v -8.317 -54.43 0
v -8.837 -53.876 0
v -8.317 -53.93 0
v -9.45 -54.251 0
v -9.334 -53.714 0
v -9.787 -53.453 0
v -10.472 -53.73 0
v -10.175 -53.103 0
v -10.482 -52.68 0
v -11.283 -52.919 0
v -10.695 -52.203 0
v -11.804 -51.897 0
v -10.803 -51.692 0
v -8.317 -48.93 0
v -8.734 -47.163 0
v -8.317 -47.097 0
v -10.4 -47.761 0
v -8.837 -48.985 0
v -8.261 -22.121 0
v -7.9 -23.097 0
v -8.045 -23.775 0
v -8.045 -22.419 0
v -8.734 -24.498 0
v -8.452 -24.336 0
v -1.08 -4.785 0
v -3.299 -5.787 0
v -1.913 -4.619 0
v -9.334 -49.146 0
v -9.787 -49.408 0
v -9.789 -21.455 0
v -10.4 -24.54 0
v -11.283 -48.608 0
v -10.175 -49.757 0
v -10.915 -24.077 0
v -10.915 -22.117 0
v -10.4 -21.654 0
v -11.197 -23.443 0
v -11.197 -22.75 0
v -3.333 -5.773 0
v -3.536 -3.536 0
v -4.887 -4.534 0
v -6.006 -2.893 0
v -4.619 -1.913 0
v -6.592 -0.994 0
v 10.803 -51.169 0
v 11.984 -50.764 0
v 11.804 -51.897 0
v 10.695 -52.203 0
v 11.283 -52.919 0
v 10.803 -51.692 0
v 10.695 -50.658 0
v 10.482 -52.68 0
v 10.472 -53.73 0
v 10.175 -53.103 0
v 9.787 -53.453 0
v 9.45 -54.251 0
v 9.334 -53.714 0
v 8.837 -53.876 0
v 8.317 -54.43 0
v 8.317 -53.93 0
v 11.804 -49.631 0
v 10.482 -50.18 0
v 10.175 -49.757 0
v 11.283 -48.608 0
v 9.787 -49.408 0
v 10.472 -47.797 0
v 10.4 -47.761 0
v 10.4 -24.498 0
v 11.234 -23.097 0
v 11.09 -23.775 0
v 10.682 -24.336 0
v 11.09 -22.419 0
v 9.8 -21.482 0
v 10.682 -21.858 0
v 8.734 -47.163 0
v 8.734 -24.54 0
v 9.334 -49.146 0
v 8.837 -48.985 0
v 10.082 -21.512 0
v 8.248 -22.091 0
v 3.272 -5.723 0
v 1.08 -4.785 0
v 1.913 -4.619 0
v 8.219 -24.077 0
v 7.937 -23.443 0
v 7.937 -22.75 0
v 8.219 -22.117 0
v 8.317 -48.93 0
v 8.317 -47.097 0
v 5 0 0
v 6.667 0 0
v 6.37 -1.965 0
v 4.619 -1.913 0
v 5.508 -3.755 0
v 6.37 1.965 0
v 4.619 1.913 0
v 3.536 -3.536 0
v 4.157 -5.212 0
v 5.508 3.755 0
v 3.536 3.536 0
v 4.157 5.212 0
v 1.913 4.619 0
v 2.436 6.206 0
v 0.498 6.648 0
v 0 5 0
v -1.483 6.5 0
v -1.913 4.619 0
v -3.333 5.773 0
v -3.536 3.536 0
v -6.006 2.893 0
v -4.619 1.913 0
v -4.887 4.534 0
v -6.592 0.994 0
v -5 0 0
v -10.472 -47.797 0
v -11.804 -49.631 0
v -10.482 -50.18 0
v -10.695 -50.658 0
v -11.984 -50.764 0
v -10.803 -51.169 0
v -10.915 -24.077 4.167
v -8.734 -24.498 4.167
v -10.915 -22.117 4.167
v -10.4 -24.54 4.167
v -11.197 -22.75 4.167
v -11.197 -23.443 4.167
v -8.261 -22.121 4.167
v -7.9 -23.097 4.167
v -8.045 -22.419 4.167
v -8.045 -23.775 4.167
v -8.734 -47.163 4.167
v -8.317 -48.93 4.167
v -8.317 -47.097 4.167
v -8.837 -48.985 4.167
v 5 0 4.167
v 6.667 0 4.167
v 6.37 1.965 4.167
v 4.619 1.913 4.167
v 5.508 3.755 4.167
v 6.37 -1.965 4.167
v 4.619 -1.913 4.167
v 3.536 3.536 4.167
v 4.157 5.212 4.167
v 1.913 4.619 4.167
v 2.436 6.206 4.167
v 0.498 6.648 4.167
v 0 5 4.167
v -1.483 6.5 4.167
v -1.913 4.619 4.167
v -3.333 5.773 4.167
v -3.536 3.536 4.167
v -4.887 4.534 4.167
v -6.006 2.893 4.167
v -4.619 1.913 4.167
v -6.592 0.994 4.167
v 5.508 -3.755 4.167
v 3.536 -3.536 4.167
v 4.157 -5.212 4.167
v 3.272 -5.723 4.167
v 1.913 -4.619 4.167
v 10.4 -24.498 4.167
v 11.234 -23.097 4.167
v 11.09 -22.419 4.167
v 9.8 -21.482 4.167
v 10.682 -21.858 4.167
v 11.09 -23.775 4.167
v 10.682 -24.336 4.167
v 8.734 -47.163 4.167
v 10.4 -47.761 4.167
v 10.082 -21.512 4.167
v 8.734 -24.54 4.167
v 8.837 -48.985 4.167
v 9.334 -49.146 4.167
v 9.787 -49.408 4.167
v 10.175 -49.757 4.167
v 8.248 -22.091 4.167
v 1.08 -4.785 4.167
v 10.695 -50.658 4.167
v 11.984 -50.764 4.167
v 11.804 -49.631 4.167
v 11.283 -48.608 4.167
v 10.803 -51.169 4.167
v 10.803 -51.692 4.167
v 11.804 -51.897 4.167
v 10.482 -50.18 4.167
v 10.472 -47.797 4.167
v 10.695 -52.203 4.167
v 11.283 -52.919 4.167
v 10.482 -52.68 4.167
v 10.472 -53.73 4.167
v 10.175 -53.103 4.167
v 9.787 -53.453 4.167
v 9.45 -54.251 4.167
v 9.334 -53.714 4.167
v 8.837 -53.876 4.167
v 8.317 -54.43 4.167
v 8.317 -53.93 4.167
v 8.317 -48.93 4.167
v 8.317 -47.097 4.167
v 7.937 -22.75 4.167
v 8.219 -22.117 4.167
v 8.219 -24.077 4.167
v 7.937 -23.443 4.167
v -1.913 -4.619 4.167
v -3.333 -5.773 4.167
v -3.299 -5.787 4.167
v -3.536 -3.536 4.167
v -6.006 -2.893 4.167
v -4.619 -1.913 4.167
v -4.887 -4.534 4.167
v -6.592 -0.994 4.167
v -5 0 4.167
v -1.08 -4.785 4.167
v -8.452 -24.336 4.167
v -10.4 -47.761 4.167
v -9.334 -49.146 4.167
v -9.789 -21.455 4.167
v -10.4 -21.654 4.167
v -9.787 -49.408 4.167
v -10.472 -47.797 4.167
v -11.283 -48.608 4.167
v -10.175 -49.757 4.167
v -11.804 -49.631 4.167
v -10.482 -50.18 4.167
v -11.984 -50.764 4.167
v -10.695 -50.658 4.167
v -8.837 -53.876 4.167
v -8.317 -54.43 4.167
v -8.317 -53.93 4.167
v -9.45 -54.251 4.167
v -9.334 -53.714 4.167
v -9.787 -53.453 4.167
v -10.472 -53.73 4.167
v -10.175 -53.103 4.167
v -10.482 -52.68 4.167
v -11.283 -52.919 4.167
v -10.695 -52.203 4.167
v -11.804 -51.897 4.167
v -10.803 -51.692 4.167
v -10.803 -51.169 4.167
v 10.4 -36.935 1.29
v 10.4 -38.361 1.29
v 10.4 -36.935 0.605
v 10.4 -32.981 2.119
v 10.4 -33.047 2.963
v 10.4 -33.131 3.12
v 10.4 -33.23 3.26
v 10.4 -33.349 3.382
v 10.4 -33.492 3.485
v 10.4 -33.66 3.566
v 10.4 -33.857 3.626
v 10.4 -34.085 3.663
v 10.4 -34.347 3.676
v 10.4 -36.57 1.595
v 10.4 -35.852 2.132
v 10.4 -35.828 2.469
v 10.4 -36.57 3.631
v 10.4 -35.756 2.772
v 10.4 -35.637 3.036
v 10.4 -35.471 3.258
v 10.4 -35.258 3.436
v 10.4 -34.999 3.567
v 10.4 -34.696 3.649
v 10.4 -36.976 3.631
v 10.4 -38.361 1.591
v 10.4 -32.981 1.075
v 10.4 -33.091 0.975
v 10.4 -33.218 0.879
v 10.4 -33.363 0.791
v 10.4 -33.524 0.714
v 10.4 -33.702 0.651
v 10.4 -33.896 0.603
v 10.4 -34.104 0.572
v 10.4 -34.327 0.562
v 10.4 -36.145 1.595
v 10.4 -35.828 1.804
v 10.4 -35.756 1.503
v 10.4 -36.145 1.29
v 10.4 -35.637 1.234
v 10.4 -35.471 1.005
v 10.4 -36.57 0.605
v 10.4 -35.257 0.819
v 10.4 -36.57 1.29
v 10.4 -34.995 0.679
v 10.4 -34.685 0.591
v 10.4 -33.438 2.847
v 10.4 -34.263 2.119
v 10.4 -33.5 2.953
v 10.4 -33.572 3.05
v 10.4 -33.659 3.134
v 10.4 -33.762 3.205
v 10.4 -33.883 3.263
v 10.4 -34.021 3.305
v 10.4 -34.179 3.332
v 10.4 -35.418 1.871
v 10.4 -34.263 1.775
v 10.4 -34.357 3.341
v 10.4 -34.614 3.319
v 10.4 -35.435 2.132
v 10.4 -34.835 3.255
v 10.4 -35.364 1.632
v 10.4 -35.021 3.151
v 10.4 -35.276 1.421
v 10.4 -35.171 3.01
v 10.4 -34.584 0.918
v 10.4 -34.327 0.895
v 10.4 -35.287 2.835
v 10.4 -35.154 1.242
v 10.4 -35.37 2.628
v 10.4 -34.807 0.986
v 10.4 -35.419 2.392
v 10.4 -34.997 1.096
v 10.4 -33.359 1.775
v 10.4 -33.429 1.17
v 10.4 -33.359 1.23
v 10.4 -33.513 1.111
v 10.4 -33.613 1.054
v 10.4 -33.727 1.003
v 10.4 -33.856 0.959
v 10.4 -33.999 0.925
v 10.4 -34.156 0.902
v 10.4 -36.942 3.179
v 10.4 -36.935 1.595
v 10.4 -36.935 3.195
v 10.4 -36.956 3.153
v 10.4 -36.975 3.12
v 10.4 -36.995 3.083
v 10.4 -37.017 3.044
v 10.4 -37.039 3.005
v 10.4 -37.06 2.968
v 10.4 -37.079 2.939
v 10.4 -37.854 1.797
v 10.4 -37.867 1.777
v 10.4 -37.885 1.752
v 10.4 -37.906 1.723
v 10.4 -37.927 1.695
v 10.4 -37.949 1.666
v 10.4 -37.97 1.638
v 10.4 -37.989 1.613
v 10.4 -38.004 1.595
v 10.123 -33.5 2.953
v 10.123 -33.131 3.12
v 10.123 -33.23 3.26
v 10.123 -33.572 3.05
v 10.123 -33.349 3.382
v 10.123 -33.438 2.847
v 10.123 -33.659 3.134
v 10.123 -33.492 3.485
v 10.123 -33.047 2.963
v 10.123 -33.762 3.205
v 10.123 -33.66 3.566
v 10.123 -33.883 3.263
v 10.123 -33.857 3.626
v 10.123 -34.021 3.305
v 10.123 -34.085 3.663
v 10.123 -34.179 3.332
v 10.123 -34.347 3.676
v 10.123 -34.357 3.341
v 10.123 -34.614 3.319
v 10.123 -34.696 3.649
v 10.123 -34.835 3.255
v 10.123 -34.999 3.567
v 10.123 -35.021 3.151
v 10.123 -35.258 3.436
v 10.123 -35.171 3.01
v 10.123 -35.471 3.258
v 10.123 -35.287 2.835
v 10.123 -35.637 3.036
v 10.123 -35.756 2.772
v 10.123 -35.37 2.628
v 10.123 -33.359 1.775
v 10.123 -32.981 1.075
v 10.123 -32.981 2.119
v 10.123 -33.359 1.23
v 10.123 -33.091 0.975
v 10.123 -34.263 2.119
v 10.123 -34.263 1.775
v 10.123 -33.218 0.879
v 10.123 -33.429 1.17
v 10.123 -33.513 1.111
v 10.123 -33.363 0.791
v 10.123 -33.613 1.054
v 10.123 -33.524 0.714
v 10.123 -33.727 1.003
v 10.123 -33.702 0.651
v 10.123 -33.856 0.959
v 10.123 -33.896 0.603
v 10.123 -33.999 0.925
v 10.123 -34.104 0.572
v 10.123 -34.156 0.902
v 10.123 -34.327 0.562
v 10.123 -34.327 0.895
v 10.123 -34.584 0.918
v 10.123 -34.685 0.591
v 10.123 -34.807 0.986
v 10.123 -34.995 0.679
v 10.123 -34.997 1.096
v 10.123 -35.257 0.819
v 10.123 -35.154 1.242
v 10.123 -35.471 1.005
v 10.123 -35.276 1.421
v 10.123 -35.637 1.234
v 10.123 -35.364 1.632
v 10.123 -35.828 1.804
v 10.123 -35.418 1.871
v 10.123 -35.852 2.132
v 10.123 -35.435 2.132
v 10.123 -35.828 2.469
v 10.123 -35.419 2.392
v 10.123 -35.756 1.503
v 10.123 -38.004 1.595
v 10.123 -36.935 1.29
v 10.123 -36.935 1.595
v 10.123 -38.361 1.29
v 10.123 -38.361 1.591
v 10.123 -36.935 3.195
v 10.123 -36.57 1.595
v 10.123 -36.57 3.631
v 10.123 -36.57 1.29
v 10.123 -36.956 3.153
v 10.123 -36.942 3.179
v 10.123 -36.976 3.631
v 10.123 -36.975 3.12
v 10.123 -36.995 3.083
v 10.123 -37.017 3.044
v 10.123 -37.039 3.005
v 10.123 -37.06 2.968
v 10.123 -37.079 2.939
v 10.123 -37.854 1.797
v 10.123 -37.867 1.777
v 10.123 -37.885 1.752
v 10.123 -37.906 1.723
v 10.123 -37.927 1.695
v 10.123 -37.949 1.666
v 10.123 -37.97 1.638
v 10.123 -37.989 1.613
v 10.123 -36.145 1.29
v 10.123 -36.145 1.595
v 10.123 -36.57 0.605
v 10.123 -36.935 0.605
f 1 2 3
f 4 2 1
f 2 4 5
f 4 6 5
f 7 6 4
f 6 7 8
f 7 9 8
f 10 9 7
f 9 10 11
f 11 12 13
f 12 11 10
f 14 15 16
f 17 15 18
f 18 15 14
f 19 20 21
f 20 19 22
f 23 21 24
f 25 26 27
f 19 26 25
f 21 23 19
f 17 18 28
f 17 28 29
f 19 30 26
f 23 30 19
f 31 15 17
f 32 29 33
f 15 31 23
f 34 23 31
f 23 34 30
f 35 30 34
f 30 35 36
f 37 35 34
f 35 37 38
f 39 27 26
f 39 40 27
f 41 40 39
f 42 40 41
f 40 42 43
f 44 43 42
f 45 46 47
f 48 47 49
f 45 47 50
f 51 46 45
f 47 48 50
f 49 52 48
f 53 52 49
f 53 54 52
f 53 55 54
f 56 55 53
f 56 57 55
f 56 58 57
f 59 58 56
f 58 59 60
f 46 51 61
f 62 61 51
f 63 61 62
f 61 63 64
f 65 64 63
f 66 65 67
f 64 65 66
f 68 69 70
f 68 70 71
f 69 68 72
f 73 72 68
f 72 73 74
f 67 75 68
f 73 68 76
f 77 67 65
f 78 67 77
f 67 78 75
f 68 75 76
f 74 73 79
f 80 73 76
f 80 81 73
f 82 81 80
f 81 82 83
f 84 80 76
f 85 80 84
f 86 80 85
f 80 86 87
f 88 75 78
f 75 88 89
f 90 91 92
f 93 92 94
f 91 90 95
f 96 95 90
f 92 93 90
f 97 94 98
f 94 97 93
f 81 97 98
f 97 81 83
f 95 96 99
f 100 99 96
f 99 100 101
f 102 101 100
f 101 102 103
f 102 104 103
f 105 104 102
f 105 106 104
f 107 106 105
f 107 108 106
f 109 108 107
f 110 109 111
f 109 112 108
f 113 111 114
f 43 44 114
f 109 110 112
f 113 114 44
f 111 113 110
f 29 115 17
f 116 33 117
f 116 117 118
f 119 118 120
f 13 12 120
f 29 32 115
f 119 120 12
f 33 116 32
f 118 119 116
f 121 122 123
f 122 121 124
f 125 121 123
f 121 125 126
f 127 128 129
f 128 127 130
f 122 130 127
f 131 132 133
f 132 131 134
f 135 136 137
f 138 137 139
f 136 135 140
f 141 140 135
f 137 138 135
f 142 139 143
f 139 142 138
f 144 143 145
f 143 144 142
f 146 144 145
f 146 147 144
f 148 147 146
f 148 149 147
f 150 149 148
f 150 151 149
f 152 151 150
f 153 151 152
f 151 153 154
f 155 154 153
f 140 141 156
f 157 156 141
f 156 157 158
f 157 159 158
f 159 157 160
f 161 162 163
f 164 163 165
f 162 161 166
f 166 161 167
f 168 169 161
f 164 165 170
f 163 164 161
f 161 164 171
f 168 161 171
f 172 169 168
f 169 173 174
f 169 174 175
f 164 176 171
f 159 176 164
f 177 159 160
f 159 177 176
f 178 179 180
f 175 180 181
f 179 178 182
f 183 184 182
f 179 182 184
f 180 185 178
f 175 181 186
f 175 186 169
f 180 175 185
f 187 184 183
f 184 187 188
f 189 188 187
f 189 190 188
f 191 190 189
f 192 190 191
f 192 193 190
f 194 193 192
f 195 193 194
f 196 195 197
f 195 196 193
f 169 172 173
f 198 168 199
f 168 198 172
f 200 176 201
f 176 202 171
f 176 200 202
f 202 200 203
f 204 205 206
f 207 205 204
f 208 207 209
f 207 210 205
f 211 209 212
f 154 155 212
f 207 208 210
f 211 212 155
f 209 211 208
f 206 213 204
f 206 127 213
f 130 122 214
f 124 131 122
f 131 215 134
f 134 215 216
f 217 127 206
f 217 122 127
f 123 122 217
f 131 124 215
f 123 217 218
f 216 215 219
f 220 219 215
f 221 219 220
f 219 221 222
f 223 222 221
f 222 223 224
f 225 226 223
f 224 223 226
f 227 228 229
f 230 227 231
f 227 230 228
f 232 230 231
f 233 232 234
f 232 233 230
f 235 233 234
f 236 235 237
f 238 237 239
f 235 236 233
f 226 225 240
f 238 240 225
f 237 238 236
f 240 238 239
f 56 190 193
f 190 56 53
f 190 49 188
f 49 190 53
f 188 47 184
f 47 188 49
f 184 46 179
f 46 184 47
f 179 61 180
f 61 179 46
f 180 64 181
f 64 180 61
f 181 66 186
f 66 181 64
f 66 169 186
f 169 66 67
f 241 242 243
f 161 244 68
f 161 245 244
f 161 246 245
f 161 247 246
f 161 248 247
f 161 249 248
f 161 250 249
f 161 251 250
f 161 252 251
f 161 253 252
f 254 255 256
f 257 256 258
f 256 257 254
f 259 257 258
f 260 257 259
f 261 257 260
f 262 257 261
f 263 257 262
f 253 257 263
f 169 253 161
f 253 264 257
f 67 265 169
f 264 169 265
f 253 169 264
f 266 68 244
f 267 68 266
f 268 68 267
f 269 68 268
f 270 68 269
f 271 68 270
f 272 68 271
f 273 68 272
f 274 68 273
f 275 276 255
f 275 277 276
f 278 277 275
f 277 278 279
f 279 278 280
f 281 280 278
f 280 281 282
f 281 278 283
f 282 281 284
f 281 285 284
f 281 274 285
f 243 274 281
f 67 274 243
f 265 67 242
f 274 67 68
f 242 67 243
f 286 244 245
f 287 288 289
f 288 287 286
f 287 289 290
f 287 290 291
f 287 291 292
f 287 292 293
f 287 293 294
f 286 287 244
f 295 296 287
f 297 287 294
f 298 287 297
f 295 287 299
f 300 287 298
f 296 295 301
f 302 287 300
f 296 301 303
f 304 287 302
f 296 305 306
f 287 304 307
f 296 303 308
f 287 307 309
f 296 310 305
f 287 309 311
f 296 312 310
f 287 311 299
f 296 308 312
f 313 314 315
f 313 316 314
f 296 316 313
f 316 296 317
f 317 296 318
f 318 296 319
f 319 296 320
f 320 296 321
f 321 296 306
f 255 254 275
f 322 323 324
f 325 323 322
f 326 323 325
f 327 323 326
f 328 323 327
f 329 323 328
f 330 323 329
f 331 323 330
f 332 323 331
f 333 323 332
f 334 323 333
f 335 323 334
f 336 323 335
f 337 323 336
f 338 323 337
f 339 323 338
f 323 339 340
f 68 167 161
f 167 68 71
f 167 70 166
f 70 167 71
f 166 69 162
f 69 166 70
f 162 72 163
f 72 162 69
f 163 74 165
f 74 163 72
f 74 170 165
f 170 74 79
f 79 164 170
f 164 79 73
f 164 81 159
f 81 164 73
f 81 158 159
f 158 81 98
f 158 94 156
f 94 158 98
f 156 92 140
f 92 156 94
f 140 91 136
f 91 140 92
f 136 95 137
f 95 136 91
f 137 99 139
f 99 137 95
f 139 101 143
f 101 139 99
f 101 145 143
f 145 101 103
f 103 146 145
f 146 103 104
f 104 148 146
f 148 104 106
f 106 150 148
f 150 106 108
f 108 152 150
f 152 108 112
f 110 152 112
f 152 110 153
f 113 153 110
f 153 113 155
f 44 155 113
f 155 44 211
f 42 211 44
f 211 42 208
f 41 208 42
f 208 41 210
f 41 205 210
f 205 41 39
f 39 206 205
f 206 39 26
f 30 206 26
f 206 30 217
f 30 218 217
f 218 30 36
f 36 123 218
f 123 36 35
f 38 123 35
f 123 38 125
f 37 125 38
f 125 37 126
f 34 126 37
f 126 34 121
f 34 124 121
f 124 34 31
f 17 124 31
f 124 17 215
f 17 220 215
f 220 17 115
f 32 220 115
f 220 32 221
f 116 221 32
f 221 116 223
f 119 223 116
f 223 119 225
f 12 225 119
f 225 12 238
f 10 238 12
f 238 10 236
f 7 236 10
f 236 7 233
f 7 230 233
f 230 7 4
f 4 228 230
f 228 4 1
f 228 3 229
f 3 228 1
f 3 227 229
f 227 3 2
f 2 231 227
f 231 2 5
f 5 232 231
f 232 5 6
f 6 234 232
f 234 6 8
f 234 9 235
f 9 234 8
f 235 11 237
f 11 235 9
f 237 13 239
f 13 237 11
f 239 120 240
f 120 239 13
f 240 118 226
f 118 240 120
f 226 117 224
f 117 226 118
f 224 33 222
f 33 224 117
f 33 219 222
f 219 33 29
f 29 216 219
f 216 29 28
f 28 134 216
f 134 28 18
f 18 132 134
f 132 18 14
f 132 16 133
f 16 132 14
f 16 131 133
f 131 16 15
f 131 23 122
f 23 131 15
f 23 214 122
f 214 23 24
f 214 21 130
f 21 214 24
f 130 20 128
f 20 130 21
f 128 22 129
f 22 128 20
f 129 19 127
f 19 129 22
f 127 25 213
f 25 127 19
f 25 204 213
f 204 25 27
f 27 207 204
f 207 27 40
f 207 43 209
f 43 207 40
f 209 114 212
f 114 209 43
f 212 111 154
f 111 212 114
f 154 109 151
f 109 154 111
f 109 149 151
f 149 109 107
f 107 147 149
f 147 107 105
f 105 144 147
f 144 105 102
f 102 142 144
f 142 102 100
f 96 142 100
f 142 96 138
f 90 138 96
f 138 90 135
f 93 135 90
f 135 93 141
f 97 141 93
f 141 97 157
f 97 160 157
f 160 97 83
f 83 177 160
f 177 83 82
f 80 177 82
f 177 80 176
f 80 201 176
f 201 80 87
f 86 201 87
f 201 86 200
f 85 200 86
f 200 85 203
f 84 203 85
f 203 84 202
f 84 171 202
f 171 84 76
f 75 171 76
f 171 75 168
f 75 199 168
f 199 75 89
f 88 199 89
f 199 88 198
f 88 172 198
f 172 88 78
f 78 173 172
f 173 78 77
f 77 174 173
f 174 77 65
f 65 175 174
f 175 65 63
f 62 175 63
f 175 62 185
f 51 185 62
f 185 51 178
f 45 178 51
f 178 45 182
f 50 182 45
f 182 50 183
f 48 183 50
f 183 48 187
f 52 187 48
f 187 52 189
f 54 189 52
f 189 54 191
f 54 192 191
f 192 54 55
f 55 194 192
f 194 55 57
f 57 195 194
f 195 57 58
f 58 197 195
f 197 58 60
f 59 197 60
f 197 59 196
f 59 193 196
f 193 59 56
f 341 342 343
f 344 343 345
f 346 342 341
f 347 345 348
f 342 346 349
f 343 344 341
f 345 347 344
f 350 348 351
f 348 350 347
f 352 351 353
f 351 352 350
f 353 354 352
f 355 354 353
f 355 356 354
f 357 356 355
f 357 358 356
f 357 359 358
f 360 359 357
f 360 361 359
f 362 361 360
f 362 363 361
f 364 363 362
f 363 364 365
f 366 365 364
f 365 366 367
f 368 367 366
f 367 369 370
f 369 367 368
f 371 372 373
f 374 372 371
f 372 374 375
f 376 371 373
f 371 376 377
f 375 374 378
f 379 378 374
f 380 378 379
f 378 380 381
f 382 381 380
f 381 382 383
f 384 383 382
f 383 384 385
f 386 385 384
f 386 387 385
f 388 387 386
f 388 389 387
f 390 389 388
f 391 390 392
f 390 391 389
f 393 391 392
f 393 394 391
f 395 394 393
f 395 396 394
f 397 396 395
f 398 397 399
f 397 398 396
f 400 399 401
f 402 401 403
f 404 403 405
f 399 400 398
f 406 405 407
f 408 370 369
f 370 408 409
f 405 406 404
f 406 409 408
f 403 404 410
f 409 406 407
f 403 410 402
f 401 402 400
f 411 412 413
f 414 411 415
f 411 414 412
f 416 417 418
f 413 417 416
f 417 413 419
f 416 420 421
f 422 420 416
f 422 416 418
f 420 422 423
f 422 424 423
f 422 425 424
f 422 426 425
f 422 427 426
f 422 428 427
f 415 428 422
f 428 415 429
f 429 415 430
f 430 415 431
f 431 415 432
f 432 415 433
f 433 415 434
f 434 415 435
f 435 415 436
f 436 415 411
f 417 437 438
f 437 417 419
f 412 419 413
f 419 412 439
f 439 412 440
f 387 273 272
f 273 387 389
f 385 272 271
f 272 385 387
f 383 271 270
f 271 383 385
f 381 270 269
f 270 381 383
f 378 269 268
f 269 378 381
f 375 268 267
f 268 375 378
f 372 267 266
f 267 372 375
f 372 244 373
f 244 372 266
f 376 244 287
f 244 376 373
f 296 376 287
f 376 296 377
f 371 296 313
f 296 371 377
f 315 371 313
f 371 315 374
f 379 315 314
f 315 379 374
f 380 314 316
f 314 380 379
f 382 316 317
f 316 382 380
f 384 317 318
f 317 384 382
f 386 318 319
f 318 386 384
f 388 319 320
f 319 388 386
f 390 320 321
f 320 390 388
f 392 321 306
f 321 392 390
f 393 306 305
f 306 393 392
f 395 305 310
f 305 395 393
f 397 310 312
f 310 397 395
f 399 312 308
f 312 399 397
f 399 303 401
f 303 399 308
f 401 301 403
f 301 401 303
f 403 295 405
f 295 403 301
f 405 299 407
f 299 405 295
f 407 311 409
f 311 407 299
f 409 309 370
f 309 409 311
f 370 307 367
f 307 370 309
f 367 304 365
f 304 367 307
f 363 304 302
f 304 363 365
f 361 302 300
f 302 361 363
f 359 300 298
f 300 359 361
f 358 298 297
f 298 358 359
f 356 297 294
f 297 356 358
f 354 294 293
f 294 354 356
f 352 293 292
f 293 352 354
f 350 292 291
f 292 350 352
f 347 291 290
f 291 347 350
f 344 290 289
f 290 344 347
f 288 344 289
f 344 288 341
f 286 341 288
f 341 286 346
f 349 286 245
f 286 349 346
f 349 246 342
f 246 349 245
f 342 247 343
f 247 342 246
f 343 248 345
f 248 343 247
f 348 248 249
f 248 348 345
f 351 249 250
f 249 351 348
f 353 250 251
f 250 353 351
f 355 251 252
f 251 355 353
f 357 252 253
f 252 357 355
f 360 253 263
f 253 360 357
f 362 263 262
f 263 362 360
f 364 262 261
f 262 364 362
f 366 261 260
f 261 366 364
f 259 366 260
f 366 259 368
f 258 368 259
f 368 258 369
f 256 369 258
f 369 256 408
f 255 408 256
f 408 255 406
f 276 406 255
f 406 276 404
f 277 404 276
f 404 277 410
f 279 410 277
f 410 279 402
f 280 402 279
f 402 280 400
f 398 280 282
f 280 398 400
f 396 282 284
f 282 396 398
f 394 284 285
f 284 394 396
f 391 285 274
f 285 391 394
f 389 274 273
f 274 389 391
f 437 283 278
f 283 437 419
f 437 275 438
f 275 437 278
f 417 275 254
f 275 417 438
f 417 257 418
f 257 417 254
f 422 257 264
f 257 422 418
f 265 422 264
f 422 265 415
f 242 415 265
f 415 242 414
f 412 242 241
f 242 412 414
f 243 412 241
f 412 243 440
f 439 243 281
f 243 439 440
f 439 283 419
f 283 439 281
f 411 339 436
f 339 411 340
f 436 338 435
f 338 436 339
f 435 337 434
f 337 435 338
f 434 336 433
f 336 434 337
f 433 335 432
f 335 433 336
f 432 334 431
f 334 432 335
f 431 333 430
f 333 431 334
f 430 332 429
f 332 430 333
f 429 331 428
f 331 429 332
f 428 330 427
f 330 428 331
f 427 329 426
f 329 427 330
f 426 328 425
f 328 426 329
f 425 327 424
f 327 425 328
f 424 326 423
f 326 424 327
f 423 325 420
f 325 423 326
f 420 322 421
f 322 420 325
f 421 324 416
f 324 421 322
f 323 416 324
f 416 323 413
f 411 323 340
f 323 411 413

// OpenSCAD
module arc(startAngle, endAngle, radius) {
    fullAngle = endAngle - startAngle;
    if (fullAngle >= 90) {
        intermediateAngle = fullAngle / 2;
        union() {
            arc(
                startAngle,
                startAngle + intermediateAngle,
                radius
            );
            arc(
                startAngle + intermediateAngle,
                endAngle,
                radius
            );
        }
    } else {
        overshootFactor = 2; // too lazy to figure the correct value out
        correctedRadius = overshootFactor * radius;
        intersection() {
            polygon([
                [0, 0],
                [
                    correctedRadius * cos(startAngle),
                    correctedRadius * sin(startAngle)
                ],
                [
                    correctedRadius * cos(endAngle),
                    correctedRadius * sin(endAngle)
                ]
            ]);
            circle(radius);
        }
    }
}

module shear2d(
    innerDiameter,
    maxThickness,
    minThickness = 0,
) {
    outerDiameter = innerDiameter + maxThickness + minThickness;
    offsetDistance = (outerDiameter / 2) - (innerDiameter / 2) - minThickness;
    difference() {
        translate([-offsetDistance, 0, 0]) {
            circle(d = outerDiameter, $fn = 20);
        }
        circle(d = innerDiameter, $fn = 30);  
        translate([-outerDiameter / 2 - offsetDistance, 0, 0]) { square(outerDiameter); }
    }
}

module calipers2d(
    hingeDiameter = 10,
    hingeAngle = 45,
    gaugeDiameter = 5,
    endThickness = 1,
    hingeThickness = 3,
    legThickness = 3,
    thighLength = 60,
    shinLength = 60
) {
    legAngle = hingeAngle / 2;
    shearOffsetAngle = 0;
    shearMaxThickness = legThickness * 1.1;
    union() {
        difference() {
            difference() {
                circle(d = hingeDiameter + (hingeThickness * 2));
                circle(d = hingeDiameter);
            }
            hingeRadius = hingeDiameter / 2;
            overshoot = 2; // required to clip away wall
            arc(
                270 - hingeAngle / 2,
                270 + hingeAngle / 2,
                hingeRadius + hingeThickness * overshoot
            );
        }
        // Thigh 1
        difference() {
            rotate(180 - legAngle, [0, 0, 1]) {
                translate([-legThickness / 2, 0, 0]) {
                    square([legThickness, thighLength]);
                }
            }
            circle(d = hingeDiameter);
        }
        // Elbow 1
        translate([
            -sin(legAngle) * thighLength,
            -cos(legAngle) * thighLength,
            0
        ]) {
            circle(legThickness, $fn = 15);
        }
        // Shin 1
        translate([
            -sin(legAngle) * thighLength,
            -cos(legAngle) * thighLength,
            0
        ]) {
            rotate(180, [0, 0, 1]) {
                translate([-legThickness / 2, 0, 0]) {
                    square([legThickness, shinLength]);
                }
            }
        }
        // Shear 1
        translate([
            -sin(legAngle) * thighLength + (legThickness * 0.75),
            -cos(legAngle) * thighLength - shinLength - (gaugeDiameter / 2) - (legThickness / 2),
            0
        ]) {
            rotate(270 - shearOffsetAngle, [0, 0, 1]) {
                shear2d(gaugeDiameter, shearMaxThickness, minThickness = endThickness);
            }
        }
        // Thigh 2
        difference() {
            rotate(180 + hingeAngle / 2, [0, 0, 1]) {
                translate([-legThickness / 2, 0, 0]) {
                    square([legThickness, thighLength]);
                }
            }
            circle(d = hingeDiameter);
        }
        // Elbow 2
        translate([
            sin(legAngle) * thighLength,
            -cos(legAngle) * thighLength,
            0
        ]) {
            circle(legThickness, $fn = 15);
        }
        // Shin 2
        translate([
            sin(legAngle) * thighLength,
            -cos(legAngle) * thighLength,
            0
        ]) {
            rotate(180, [0, 0, 1]) {
                translate([-legThickness / 2, 0, 0]) {
                    square([legThickness, shinLength]);
                }
            }
        }
        // Shear 2
        translate([
            sin(legAngle) * thighLength - (legThickness * 0.75),
            -cos(legAngle) * thighLength - shinLength - (gaugeDiameter / 2) - (legThickness / 2),
            0
        ]) {
            rotate(90 + shearOffsetAngle, [0, 0, 1]) {
                rotate(180, [0, 1, 0]) {
                    shear2d(gaugeDiameter, shearMaxThickness, minThickness = endThickness);
                }
            }
        }
    }
}

module calipers(gaugeDiameter, text) {
    hingeAngle = 45;
    hingeDiameter = gaugeDiameter * 2;
    thighLength = gaugeDiameter * 5;
    shinLength = thighLength;
    endThickness = 0.5;
    legThickness = gaugeDiameter / 3;
    hingeThickness = legThickness;
    overallWidth = legThickness * 2.5;
    textMargin = 1;
    difference() {
        linear_extrude(overallWidth) {
            calipers2d(
                hingeAngle = hingeAngle,
                hingeDiameter = hingeDiameter,
                gaugeDiameter = gaugeDiameter,
                thighLength = thighLength,
                shinLength = shinLength,
                endThickness = endThickness,
                legThickness = legThickness,
                hingeThickness = hingeThickness
            );
        }
    
        translate([
            sin(hingeAngle / 2) * thighLength + (legThickness / 3),
            -cos(hingeAngle / 2) * thighLength - (shinLength / 2),
            overallWidth / 2
        ]) {
            rotate(90, [0, 1, 0]) {
                rotate(90, [0, 0, 1]) {
                    linear_extrude(legThickness / 3) {
                        text(
                            "4G",
                            size = overallWidth - textMargin,
                            valign = "center",
                            halign = "center"
                        );
                    }
                }
            }
        }
    }
}

calipers(5, "4G");
